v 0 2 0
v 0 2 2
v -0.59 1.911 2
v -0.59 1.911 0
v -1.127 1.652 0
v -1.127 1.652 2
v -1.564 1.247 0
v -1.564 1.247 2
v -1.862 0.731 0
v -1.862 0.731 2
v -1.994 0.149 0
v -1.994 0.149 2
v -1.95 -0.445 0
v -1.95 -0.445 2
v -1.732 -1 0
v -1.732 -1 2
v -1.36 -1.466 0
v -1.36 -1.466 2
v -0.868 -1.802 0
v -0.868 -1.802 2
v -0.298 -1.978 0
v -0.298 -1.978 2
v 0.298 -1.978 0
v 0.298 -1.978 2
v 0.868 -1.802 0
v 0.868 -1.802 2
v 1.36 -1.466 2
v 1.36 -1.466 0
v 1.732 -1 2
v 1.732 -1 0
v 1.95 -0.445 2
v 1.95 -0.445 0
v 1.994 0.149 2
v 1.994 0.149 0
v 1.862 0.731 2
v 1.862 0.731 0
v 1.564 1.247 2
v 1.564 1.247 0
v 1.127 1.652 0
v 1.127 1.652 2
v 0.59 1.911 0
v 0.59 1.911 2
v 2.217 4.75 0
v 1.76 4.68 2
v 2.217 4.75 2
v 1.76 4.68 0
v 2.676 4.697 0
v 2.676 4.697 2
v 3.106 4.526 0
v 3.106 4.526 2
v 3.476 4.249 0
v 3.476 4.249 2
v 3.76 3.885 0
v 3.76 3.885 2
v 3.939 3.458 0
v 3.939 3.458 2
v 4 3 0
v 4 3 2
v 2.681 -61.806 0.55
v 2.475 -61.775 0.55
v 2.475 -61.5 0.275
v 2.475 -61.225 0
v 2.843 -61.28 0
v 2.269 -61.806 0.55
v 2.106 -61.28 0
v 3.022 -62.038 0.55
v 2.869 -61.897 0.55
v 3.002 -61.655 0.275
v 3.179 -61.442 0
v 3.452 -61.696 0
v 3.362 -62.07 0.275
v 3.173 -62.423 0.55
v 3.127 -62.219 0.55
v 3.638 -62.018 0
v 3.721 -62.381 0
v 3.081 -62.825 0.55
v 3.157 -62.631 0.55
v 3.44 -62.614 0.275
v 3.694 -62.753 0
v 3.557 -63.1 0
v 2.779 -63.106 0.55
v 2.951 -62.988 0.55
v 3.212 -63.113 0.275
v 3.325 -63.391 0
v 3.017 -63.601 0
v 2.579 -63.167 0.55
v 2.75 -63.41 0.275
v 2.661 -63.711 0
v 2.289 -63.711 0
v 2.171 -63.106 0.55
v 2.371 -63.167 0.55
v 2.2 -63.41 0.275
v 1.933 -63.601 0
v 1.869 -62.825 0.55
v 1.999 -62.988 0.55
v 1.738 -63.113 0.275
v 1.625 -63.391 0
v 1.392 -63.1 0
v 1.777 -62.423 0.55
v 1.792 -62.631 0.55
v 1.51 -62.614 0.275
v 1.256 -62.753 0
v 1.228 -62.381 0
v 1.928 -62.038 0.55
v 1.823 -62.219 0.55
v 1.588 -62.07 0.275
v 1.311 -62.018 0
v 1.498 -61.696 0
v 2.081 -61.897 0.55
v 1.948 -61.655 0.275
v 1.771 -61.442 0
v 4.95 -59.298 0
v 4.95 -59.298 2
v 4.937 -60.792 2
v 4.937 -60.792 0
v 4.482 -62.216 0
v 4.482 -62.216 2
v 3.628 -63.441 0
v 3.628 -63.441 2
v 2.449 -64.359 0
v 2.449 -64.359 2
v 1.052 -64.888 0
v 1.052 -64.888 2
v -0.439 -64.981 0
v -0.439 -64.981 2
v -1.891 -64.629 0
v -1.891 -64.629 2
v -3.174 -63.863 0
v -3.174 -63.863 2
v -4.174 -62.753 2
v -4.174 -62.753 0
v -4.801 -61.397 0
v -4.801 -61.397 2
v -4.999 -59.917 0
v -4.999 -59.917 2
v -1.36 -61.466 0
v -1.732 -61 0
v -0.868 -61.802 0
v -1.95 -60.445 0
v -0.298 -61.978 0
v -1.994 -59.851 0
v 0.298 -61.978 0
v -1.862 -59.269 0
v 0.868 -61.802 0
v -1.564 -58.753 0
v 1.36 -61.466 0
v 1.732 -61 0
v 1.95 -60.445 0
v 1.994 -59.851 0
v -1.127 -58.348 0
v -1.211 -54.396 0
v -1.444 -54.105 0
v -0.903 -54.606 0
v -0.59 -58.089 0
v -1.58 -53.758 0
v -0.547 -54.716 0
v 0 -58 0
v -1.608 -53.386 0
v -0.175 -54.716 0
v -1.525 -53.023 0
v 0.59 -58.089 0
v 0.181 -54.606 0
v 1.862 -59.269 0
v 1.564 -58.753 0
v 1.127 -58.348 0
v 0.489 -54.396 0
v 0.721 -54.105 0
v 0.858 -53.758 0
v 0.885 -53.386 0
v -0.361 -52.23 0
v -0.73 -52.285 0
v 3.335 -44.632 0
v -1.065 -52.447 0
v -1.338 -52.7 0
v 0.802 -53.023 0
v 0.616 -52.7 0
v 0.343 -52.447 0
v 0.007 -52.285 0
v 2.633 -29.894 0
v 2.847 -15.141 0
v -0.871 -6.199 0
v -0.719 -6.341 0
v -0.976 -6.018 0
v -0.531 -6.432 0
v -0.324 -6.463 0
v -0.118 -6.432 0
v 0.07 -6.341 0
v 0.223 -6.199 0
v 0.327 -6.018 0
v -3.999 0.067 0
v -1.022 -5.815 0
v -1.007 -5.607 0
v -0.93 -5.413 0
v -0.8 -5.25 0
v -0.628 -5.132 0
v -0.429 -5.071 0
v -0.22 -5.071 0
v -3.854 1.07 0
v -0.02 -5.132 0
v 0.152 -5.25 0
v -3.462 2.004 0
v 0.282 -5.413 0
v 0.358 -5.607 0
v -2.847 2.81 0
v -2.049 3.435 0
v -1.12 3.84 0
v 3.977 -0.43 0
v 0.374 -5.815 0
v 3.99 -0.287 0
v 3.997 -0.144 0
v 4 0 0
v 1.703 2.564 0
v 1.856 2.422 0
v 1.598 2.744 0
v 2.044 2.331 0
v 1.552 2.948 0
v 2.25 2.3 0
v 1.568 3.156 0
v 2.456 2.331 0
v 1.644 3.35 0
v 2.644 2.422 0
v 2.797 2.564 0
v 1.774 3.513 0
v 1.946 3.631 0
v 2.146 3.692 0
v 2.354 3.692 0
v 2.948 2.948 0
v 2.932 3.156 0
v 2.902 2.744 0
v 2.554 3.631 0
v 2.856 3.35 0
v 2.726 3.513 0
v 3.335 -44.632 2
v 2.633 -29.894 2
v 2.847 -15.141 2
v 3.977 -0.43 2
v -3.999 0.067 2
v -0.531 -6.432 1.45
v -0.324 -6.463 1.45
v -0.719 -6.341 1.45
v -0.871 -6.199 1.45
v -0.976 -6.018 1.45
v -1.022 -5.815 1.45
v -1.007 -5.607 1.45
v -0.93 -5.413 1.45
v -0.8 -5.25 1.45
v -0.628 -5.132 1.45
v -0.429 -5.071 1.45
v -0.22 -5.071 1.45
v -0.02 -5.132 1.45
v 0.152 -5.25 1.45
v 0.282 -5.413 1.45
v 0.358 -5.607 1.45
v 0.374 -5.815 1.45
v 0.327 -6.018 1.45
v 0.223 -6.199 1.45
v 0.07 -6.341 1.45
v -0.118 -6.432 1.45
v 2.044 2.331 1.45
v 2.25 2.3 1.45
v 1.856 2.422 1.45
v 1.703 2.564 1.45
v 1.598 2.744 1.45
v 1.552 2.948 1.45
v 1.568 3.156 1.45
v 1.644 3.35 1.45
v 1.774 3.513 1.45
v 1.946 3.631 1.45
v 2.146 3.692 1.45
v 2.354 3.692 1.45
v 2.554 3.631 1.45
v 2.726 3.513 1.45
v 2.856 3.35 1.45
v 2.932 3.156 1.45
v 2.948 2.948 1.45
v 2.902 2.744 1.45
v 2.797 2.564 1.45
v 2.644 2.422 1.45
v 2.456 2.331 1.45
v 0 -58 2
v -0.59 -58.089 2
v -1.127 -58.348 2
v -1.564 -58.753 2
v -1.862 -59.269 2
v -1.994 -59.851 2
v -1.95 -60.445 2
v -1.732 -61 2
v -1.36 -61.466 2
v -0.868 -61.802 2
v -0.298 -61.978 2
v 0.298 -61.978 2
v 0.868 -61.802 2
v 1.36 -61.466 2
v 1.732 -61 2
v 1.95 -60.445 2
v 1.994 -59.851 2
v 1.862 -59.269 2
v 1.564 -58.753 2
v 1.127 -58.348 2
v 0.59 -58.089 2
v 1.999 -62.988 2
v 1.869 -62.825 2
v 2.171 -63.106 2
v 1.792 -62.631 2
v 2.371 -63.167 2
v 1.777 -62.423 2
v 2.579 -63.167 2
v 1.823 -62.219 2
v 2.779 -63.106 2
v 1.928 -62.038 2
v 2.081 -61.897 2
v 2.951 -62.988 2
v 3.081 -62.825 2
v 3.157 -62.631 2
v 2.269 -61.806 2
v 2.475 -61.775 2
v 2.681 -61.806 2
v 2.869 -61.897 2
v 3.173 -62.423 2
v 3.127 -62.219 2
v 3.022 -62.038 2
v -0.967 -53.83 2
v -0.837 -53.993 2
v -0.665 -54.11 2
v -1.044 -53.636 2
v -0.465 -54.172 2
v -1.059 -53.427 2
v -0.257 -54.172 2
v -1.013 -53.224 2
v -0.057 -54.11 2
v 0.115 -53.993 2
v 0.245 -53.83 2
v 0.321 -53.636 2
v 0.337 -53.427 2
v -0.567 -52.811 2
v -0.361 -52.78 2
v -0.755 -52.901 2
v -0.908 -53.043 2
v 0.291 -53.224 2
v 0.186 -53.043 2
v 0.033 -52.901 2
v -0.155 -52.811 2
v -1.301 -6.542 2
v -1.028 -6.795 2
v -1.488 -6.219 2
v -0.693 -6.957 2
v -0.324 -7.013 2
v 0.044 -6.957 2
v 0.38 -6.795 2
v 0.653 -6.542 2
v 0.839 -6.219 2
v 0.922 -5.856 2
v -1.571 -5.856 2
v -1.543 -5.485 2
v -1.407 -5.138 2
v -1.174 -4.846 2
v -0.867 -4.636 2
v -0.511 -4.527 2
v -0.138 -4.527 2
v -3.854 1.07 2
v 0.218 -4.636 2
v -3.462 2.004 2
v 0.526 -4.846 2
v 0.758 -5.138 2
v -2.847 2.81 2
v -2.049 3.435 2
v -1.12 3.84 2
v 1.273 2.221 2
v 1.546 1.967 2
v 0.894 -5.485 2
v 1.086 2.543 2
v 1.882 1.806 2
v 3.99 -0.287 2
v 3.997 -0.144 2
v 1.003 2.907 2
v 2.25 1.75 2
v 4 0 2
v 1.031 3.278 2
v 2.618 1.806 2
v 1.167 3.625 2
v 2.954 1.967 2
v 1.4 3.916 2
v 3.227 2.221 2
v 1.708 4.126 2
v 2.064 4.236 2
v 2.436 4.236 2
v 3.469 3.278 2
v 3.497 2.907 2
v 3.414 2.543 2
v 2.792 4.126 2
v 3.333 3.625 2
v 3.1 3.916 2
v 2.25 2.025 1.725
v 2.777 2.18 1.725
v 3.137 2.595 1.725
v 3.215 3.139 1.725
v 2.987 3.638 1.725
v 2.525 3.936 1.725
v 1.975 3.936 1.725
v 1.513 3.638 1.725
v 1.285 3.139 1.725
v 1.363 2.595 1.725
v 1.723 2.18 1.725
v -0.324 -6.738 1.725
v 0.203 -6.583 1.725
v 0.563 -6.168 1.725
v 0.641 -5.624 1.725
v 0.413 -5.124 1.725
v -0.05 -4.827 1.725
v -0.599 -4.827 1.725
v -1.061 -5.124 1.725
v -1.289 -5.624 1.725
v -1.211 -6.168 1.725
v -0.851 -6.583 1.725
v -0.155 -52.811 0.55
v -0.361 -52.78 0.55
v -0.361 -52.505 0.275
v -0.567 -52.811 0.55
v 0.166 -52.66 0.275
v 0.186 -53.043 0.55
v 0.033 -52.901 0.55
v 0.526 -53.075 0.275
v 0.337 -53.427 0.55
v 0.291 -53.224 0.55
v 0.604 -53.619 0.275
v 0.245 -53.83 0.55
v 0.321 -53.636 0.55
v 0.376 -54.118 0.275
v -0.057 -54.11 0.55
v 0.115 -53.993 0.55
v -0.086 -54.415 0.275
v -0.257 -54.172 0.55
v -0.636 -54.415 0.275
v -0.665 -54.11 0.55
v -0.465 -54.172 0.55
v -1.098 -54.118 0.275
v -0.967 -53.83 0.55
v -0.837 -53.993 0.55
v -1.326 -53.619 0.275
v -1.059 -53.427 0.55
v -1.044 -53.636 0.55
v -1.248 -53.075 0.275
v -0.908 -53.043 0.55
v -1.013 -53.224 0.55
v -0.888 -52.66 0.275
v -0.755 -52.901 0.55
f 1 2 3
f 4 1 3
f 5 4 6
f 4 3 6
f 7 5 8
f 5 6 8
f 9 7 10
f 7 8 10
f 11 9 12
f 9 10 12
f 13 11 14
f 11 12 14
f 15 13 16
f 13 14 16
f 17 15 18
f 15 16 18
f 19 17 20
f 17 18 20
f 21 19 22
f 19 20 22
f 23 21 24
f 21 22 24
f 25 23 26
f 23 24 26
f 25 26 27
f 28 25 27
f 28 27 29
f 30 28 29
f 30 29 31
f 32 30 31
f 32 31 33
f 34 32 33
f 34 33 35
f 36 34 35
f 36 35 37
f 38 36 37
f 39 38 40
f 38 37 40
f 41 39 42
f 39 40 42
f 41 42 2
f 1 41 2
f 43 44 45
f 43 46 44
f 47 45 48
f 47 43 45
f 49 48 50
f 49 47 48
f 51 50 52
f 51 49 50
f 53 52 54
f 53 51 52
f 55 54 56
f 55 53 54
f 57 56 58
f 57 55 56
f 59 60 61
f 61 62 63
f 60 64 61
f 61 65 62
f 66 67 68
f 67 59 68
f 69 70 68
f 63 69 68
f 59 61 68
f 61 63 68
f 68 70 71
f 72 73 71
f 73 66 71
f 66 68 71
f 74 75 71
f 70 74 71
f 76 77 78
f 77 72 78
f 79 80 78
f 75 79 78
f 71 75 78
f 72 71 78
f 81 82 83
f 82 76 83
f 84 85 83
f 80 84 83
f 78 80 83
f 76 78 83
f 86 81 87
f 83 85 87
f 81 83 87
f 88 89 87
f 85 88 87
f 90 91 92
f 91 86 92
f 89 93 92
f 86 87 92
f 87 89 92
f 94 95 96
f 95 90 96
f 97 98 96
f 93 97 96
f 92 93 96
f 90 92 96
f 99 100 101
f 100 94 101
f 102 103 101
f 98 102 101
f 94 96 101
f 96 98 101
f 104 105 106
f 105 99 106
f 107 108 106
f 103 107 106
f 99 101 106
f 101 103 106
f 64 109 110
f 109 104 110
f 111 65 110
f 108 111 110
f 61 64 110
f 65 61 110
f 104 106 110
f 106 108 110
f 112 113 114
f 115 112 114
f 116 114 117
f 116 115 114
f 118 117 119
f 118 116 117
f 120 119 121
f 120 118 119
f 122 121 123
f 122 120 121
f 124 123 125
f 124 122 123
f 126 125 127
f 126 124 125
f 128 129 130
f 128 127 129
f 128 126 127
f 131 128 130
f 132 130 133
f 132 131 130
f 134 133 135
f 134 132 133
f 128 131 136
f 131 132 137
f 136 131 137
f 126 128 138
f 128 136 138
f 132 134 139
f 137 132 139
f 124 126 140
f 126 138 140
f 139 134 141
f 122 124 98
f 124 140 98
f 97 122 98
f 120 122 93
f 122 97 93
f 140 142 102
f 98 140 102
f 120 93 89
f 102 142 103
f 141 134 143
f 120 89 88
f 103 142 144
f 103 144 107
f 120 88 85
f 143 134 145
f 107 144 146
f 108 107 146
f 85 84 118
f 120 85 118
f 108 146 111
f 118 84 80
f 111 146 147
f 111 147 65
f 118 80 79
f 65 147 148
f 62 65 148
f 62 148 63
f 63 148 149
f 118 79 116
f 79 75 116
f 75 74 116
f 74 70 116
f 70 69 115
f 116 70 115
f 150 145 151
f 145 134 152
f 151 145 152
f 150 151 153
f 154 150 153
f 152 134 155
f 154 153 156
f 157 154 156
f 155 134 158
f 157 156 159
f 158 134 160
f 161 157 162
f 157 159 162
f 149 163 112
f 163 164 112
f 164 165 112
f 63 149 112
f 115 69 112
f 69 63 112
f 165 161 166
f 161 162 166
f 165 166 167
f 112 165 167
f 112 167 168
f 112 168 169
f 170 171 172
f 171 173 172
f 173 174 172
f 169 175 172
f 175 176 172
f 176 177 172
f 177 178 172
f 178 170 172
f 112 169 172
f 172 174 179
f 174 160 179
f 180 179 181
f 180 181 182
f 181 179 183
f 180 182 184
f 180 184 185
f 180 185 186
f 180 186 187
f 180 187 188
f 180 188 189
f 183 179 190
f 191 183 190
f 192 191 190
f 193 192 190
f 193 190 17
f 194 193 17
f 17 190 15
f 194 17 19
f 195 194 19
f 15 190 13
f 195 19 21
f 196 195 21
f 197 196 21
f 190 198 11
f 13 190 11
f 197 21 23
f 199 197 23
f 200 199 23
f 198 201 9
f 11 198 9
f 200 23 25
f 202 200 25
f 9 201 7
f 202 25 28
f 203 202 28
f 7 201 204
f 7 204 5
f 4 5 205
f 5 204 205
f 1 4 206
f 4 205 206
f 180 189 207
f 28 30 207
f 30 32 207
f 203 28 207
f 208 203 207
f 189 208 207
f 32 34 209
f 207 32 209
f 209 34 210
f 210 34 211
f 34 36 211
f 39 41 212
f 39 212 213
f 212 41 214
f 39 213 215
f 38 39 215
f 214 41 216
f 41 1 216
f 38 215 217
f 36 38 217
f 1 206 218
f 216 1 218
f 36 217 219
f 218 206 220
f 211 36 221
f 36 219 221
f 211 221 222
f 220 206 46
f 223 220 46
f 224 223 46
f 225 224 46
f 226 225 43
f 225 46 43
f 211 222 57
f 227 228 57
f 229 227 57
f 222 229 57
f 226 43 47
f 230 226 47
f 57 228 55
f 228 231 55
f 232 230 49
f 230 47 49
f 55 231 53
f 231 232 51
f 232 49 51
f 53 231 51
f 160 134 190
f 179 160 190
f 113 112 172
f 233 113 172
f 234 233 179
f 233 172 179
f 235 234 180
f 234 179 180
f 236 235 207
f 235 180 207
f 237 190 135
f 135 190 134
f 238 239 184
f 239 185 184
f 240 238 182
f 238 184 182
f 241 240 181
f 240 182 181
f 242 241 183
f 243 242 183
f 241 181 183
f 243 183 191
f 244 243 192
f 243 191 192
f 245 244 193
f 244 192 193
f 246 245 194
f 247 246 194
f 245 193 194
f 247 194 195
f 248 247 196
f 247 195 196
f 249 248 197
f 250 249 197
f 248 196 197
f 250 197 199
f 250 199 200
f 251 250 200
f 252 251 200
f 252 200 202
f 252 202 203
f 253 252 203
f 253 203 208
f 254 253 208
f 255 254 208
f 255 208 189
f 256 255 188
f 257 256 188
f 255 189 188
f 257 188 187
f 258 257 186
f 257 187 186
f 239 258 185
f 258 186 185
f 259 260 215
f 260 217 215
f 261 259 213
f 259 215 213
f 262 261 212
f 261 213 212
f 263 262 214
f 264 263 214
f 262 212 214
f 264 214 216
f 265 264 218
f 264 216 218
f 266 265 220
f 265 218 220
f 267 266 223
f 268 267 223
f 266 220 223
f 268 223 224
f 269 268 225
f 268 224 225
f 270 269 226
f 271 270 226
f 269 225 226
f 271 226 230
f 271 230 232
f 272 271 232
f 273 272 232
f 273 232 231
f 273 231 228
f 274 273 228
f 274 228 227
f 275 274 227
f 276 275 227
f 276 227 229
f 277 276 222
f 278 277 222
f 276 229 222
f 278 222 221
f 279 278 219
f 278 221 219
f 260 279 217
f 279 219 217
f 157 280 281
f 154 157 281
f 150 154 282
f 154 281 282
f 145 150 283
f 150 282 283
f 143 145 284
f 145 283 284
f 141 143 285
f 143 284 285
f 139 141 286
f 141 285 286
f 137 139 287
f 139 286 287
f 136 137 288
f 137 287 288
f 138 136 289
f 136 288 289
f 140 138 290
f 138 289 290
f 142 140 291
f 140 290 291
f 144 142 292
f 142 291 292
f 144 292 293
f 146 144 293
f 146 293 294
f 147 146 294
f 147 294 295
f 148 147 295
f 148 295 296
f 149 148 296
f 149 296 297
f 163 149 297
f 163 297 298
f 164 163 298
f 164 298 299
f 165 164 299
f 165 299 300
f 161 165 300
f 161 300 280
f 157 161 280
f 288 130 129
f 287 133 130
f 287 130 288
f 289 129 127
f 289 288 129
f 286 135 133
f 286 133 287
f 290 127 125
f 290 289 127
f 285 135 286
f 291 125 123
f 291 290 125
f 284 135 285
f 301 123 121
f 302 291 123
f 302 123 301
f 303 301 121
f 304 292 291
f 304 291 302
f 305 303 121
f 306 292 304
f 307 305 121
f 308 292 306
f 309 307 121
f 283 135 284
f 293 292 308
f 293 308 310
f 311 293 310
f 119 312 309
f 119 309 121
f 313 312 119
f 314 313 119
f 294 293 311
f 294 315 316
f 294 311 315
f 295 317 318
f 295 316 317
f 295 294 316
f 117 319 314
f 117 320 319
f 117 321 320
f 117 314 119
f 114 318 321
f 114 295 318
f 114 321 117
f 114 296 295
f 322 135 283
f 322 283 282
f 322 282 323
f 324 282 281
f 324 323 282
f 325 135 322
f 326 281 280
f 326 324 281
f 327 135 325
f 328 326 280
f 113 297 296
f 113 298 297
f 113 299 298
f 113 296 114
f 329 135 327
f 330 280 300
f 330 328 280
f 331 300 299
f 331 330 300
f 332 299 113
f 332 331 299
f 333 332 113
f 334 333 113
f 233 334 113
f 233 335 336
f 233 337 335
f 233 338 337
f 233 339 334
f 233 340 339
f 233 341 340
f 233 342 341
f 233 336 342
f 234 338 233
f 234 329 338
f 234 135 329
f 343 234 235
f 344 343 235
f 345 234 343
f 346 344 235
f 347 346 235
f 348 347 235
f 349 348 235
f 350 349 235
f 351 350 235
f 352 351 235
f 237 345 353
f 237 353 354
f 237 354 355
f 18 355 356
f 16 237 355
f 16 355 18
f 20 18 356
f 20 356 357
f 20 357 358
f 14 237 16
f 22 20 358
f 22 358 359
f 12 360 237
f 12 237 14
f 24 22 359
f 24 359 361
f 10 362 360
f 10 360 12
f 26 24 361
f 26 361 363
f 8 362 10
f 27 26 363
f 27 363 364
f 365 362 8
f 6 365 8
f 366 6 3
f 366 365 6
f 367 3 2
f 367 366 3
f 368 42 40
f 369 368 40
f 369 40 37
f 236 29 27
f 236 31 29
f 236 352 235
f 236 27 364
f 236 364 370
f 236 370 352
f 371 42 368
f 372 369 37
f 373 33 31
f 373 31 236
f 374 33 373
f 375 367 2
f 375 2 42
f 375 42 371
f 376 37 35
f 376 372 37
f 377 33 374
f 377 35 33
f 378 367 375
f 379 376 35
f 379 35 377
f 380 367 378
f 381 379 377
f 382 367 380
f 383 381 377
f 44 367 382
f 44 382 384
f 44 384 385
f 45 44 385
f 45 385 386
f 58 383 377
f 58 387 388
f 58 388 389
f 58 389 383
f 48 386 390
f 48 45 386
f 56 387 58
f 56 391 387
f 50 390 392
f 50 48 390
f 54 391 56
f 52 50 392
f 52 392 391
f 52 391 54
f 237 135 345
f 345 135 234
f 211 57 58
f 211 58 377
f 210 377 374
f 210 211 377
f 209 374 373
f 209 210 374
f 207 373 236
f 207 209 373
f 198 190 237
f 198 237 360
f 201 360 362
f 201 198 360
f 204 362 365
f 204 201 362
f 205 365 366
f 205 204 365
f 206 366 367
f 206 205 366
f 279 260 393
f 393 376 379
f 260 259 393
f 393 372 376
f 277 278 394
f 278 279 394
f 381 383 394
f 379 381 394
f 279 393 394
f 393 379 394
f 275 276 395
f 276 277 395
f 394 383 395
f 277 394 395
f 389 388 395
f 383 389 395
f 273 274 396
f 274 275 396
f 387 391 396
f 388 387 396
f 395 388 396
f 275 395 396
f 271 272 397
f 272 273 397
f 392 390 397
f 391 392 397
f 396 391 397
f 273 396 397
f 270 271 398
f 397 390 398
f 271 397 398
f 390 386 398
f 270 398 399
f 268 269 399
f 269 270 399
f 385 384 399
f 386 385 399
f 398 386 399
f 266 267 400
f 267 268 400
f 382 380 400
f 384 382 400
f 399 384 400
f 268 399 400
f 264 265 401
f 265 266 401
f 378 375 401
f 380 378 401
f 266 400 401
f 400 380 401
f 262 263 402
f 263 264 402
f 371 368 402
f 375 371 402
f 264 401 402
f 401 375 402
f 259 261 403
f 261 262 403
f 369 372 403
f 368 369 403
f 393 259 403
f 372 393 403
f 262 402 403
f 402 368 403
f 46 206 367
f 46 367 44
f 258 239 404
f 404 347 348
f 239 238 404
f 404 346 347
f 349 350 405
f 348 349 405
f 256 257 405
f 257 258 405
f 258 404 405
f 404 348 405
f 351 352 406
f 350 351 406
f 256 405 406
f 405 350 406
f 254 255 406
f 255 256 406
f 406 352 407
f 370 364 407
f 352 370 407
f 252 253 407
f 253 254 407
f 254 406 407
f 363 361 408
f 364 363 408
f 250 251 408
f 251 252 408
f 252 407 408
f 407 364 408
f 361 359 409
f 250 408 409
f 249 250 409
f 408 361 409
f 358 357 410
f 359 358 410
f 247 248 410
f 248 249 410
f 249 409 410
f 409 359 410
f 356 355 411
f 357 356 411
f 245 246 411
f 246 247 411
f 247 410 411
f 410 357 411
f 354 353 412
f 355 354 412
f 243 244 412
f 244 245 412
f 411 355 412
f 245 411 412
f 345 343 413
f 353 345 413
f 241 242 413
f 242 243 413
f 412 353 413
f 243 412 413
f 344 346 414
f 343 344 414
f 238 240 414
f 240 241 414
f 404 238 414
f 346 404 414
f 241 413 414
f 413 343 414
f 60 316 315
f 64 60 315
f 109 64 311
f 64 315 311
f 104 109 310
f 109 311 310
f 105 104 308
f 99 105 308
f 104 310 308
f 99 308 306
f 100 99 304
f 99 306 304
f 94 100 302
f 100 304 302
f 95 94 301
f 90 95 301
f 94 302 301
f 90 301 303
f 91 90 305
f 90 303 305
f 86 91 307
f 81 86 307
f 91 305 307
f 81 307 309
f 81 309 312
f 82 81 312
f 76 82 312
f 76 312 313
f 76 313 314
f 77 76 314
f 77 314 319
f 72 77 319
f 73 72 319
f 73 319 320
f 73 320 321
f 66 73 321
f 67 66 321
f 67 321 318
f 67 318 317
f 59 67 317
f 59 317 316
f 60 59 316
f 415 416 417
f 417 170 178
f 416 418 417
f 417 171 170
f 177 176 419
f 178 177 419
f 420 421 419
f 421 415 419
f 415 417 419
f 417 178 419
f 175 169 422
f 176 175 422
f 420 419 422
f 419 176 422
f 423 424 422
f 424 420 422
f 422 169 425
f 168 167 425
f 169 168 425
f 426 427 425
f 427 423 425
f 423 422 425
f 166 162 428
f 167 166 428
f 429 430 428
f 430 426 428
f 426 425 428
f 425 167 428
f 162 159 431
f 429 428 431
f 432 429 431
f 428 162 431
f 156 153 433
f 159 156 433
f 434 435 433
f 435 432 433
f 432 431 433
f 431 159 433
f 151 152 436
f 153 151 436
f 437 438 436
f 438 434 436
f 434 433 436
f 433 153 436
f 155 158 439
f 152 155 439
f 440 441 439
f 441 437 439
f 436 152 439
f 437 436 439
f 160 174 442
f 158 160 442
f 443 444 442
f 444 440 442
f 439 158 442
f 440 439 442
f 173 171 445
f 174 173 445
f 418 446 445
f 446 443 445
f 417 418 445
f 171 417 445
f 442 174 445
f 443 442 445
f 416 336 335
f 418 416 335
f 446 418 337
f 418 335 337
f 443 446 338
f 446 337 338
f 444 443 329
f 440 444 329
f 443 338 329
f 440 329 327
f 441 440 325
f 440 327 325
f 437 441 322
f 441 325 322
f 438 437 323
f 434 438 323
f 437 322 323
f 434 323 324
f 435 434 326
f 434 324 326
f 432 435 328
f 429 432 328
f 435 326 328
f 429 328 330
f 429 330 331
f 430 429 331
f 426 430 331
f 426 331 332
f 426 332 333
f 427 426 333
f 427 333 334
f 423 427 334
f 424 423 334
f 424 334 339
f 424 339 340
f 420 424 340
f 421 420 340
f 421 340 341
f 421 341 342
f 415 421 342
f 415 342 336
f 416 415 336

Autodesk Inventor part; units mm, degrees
ref_plane "YZ Plane" through (0, 0, 0) normal (1, 0, 0) x (0, 1, 0)
ref_plane "XZ Plane" through (0, 0, 0) normal (0, 1, 0) x (-1, 0, 0)
ref_plane "XY Plane" through (0, 0, 0) normal (0, 0, 1) x (1, 0, 0)
sketch "スケッチ1" plane through (0, 0, 0) normal (0, 0, 1) x (1, 0, 0)
  line L0 (0, 0) -> (0, -60) construction
  arc A0 (0, -4) -> (3.9768, -0.4299) centre (0, 0) ccw construction
  arc A1 (0, -55) -> (-4.9993, -59.9167) centre (0, -60) ccw construction
  arc A2 (3.9768, -0.4299) -> (4.9505, -59.2985) centre (240.1879, -25.9652) ccw
  arc A3 (-3.9994, 0.0667) -> (0, -4) centre (0, 0) ccw construction
  arc A4 (3.9768, -0.4299) -> (4, 0) centre (0, 0) ccw
  arc A5 (4.9505, -59.2985) -> (0, -55) centre (0, -60) ccw construction
  arc A6 (-4.9993, -59.9167) -> (4.9505, -59.2985) centre (0, -60) ccw
  line L1 (-3.9994, 0.0667) -> (-4.9993, -59.9167)
  line L2 (2.6336, -22.0054) -> (2.3154, -41.0967) construction
  circle A7 centre (0, 0) radius 2 construction
  line L3 (-1.12, 3.84) -> (1.76, 4.68)
  line L4 (4, 3) -> (4, 0)
  arc A8 (4, 3) -> (1.76, 4.68) centre (2.25, 3) ccw
  circle A9 centre (2.25, 3) radius 1 construction
  arc A10 (-1.12, 3.84) -> (-3.9994, 0.0667) centre (0, 0) ccw
  arc A11 (4, 0) -> (-1.12, 3.84) centre (0, 0) ccw construction
  circle A12 centre (2.25, 3) radius 1.75 construction
  line L5 (-0.3242, -5.7627) -> (0, 0) construction
  circle A13 centre (-0.3242, -5.7627) radius 3.7718 construction
  circle A14 centre (0, -60) radius 2 construction
  circle A15 centre (0, -60) radius 3.5 construction
  line L6 (0, -60) -> (2.4749, -62.4749) construction
  circle A16 centre (-0.3611, -53.4798) radius 4.5302 construction
  dimension "d26" = 7
  dimension "d0" = 60
  dimension "d1" = 4
  dimension "d2" = 5
  dimension "d14" = 7
  dimension "d15" = 4
  dimension "d16" = 1.75
  dimension "d17" = 2
  dimension "d25" = 4
  dimension "d27" = 45
extrude "押し出し1" add sketch "スケッチ1" along normal blind 2
hole "穴1" at (0, 0, 0) at (0, -60, 0) direction (0, 0, 1) diameter 4 end through all
hole "穴2" at (-0.3611, -53.4798, 0) at (2.4749, -62.4749, 0) direction (0, 0, 1) diameter 1.4 end through all countersink diameter 2.5 countersink angle 90
sketch "スケッチ2" plane through (0, 0, 2) normal (0, 0, 1) x (1, 0, 0)
  point P0 (0, 0)
  point P1 (2.25, 3)
  point P2 (-0.3242, -5.7627)
hole "穴4" at (2.25, 3, 2) at (-0.3242, -5.7627, 2) direction (0, 0, -1) diameter 1.4 end through all countersink diameter 2.5 countersink angle 90
properties part number "COXA_ROLL_LONG-LINK"
